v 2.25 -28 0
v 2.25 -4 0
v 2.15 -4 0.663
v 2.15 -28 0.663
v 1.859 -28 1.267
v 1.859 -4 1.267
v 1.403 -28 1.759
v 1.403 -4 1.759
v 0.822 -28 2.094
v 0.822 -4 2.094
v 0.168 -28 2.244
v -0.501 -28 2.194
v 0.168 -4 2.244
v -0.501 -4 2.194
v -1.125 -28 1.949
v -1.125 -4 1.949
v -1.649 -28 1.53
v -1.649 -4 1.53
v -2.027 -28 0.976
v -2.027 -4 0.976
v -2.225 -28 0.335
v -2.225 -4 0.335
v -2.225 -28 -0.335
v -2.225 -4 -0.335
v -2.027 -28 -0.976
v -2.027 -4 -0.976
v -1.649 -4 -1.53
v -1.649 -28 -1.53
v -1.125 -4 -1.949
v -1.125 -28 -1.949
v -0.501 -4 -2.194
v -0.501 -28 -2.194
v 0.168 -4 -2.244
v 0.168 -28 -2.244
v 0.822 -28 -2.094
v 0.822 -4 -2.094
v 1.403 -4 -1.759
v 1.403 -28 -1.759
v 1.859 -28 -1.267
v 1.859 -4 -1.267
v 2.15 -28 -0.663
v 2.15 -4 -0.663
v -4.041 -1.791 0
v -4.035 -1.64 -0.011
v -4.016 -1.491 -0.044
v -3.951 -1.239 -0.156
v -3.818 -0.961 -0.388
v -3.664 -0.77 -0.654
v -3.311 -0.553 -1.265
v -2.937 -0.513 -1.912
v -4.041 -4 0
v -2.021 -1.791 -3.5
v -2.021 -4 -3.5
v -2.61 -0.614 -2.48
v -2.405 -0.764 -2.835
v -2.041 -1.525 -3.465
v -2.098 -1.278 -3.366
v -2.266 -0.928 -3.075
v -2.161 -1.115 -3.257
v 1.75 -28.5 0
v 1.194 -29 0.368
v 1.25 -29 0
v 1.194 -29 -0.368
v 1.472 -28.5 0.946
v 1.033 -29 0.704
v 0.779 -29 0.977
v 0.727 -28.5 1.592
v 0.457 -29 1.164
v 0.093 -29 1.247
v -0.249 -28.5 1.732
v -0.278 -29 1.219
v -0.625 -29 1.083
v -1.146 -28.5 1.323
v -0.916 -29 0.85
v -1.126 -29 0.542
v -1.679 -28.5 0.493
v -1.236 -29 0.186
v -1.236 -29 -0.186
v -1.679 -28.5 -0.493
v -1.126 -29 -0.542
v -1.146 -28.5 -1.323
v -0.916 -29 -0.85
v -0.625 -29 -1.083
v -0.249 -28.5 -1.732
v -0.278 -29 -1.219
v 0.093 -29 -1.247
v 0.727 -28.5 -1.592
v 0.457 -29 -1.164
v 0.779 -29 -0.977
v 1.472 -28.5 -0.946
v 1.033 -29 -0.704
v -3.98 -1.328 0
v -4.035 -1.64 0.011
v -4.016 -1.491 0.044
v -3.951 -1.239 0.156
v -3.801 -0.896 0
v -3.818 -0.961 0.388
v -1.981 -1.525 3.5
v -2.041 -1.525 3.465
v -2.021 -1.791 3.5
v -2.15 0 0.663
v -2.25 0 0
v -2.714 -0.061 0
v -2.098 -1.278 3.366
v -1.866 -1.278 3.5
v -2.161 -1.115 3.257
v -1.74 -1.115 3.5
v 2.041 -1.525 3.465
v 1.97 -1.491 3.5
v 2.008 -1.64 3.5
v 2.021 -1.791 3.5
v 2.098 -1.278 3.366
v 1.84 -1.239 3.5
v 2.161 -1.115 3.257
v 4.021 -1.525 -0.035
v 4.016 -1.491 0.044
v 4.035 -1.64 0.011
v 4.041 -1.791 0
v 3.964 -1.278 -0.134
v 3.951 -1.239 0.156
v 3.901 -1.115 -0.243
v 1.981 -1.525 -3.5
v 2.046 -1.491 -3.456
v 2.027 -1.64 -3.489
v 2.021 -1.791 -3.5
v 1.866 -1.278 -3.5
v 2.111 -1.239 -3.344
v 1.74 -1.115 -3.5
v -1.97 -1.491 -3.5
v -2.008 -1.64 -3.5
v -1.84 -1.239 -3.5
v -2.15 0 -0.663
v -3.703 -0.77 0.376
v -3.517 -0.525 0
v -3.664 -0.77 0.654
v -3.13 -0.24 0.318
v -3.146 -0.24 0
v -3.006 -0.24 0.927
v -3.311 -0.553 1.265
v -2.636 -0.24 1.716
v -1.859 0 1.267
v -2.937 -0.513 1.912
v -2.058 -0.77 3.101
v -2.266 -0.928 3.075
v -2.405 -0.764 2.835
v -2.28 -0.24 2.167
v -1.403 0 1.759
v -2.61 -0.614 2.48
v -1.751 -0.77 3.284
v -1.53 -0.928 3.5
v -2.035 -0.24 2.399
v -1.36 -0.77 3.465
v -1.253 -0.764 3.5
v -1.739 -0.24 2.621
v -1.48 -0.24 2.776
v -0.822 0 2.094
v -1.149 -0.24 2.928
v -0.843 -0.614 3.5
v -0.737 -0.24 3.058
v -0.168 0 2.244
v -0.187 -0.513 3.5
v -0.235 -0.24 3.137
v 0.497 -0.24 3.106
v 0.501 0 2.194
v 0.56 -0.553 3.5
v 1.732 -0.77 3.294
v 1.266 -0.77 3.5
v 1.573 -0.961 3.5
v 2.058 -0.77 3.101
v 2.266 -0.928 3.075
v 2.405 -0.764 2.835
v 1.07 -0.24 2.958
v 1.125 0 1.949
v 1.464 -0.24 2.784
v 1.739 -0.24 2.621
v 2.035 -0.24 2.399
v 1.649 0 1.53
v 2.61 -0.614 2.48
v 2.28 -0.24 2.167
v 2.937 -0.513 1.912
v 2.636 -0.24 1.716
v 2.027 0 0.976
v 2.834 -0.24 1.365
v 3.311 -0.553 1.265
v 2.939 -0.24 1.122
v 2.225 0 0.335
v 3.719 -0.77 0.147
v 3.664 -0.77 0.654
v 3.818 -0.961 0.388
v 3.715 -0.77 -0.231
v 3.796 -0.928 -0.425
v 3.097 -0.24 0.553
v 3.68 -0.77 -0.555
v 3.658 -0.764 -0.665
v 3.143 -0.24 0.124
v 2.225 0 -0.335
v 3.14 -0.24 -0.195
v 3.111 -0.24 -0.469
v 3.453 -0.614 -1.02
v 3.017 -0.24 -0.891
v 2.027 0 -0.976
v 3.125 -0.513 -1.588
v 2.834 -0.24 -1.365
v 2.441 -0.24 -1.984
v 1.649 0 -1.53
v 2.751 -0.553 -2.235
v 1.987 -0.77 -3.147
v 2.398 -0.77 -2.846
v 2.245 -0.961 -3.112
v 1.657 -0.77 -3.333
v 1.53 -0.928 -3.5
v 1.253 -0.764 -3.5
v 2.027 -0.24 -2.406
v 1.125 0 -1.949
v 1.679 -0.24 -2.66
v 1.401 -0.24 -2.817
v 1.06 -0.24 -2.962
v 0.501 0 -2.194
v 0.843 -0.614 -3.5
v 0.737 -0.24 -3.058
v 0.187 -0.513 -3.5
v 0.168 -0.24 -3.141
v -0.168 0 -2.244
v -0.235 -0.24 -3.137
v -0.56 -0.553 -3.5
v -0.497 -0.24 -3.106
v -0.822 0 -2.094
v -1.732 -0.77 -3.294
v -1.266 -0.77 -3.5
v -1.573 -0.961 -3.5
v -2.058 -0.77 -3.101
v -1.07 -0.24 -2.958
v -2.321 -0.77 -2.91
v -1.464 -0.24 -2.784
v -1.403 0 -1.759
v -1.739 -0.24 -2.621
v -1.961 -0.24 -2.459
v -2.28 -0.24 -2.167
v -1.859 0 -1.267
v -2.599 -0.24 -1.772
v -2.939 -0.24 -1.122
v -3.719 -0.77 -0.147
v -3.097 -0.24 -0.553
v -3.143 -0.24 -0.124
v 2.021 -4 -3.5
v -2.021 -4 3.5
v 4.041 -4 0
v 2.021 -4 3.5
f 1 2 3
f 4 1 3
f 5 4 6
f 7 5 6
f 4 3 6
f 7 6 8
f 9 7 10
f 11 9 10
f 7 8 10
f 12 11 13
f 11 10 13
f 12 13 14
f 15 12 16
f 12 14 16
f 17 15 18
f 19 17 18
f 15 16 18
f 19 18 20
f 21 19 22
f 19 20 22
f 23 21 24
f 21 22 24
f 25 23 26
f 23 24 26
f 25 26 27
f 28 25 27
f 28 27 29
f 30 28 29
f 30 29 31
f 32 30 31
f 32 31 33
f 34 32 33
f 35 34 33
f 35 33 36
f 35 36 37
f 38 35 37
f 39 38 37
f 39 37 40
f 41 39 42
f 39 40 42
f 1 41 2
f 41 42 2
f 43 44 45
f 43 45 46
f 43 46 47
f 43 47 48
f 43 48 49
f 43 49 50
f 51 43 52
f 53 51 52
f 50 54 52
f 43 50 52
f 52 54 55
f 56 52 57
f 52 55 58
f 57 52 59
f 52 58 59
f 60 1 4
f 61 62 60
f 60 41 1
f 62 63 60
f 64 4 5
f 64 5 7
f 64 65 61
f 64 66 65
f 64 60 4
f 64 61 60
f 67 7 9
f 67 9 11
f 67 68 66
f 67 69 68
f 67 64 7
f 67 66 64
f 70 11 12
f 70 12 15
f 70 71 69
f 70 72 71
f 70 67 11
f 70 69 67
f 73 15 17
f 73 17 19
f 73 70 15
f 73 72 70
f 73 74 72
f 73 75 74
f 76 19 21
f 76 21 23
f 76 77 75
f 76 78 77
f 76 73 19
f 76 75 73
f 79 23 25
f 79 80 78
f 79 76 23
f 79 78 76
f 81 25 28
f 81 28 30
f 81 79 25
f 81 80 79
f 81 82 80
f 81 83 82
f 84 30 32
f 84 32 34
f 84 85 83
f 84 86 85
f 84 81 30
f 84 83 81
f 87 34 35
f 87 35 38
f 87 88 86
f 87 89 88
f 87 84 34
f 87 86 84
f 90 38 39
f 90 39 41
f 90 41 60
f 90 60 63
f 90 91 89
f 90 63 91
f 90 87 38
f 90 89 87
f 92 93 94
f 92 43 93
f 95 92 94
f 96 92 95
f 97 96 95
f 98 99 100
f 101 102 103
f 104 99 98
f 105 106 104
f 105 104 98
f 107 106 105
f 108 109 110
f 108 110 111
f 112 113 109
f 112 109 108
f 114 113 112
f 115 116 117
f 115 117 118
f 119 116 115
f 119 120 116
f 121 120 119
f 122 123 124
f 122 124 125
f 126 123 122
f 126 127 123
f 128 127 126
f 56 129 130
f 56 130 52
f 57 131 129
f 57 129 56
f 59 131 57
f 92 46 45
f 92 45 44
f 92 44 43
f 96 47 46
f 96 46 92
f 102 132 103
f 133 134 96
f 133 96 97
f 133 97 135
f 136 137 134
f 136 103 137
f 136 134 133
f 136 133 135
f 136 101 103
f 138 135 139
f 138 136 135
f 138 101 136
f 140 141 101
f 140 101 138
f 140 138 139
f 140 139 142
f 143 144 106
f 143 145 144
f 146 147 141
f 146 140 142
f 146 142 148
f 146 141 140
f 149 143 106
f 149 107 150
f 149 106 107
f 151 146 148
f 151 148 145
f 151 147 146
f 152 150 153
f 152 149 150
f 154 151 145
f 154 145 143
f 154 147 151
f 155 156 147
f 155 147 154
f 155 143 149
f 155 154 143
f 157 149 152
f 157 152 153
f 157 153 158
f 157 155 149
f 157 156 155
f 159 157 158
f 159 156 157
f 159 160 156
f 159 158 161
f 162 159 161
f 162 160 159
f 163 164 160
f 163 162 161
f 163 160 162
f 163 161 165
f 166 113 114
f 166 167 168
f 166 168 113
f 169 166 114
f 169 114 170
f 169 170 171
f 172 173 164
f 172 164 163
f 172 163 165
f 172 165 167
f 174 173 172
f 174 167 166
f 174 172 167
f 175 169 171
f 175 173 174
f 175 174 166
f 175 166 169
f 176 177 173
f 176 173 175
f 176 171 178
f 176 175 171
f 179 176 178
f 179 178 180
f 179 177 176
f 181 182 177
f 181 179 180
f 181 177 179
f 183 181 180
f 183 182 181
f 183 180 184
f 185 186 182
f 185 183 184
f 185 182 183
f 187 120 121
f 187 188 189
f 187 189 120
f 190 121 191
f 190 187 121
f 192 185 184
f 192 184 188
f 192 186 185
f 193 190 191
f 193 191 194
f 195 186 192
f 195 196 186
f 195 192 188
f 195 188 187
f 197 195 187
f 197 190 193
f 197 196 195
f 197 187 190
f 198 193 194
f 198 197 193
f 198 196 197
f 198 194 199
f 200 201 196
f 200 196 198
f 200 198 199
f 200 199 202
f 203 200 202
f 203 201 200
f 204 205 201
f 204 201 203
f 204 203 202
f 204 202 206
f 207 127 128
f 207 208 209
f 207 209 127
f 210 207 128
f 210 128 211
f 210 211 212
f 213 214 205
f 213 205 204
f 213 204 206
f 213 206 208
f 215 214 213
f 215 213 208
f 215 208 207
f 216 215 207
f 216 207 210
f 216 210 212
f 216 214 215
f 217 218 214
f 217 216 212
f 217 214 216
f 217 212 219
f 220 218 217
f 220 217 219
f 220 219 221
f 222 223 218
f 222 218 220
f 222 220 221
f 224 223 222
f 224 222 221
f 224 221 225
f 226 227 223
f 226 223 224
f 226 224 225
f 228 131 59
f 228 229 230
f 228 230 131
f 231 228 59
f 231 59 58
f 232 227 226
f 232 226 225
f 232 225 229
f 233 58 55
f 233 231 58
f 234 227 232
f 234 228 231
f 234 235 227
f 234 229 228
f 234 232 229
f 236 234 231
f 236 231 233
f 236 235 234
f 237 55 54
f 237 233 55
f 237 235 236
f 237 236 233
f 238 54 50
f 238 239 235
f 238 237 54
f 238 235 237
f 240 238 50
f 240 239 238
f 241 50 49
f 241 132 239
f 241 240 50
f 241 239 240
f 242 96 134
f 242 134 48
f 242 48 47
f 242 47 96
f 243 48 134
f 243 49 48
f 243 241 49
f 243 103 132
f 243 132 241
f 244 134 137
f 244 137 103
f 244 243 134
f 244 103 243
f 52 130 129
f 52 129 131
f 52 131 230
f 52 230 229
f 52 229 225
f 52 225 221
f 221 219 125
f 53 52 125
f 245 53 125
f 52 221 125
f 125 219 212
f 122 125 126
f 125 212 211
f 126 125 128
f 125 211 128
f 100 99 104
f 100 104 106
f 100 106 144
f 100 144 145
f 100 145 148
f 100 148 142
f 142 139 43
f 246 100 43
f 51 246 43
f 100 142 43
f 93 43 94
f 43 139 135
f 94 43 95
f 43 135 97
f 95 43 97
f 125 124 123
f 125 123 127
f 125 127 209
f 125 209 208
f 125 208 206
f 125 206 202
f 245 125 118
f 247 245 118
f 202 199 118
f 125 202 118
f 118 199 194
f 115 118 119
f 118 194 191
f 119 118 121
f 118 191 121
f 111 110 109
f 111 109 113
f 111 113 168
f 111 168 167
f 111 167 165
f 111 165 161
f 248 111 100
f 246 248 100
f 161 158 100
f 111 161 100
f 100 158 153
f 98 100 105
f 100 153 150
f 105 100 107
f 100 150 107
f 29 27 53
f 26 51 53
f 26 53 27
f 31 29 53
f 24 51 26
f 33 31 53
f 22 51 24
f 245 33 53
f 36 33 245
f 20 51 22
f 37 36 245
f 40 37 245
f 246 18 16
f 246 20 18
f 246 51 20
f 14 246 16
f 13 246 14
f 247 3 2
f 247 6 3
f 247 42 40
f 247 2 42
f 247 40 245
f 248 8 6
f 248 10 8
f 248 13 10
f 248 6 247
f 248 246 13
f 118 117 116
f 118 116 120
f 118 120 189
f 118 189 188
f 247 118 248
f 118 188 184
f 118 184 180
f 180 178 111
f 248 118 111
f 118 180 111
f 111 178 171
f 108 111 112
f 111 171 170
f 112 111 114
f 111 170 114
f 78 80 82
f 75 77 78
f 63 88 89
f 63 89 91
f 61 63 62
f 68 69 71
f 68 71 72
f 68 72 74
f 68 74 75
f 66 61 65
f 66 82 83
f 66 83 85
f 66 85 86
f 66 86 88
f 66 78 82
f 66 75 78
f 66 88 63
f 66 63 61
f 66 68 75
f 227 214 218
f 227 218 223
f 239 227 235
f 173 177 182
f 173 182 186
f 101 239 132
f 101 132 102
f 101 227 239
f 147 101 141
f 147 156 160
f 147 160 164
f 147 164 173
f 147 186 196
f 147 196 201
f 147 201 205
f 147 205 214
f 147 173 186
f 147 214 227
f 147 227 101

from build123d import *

# Parameters (mm, degrees)
F1_DEPTH = 4
F2_R     = 2.25
F3_DEPTH = 25
F6_SIZE  = 1


with BuildPart() as f1:
    # F0 (on Front) → F1 (new body)
    with BuildSketch(Plane.XZ):
        Polygon((2.020726, 3.5), (-2.020726, 3.5), (-4.041452, 0), (-2.020726, -3.5), (2.020726, -3.5), (4.041452, 0), align=None)
    extrude(amount=F1_DEPTH)

    # F2 (on face) → F3 (join)
    with BuildSketch(Plane.XZ.offset(4)):
        Circle(F2_R)
    extrude(amount=F3_DEPTH)

    # F4 (on Top) → F5 (revolve, cut)
    with BuildSketch(Plane.XY):
        with BuildLine():
            Line((-7.239562, -3.979997), (-4.041452, -3.979997))
            Line((-4.041452, -3.979997), (-4.041452, -1.791452))
            ThreePointArc((-4.041452, -1.791452), (-3.516748, -0.524704), (-2.25, 0))
            Line((-2.25, 0), (0, 0))
            Line((0, 0), (0, 3.398254))
            Line((0, 3.398254), (-7.627891, 4.230388))
            Line((-7.627891, 4.230388), (-7.239562, -3.979997))
        make_face()
    revolve(axis=Axis((0, 1.699127, 0), (0, 1, 0)), mode=Mode.SUBTRACT)

    # F6
    f6_edges = [f1.edges().sort_by_distance(p)[0] for p in [
        (-2.25, -29, 0),
    ]]
    chamfer(f6_edges, length=F6_SIZE)


solid = f1.part
